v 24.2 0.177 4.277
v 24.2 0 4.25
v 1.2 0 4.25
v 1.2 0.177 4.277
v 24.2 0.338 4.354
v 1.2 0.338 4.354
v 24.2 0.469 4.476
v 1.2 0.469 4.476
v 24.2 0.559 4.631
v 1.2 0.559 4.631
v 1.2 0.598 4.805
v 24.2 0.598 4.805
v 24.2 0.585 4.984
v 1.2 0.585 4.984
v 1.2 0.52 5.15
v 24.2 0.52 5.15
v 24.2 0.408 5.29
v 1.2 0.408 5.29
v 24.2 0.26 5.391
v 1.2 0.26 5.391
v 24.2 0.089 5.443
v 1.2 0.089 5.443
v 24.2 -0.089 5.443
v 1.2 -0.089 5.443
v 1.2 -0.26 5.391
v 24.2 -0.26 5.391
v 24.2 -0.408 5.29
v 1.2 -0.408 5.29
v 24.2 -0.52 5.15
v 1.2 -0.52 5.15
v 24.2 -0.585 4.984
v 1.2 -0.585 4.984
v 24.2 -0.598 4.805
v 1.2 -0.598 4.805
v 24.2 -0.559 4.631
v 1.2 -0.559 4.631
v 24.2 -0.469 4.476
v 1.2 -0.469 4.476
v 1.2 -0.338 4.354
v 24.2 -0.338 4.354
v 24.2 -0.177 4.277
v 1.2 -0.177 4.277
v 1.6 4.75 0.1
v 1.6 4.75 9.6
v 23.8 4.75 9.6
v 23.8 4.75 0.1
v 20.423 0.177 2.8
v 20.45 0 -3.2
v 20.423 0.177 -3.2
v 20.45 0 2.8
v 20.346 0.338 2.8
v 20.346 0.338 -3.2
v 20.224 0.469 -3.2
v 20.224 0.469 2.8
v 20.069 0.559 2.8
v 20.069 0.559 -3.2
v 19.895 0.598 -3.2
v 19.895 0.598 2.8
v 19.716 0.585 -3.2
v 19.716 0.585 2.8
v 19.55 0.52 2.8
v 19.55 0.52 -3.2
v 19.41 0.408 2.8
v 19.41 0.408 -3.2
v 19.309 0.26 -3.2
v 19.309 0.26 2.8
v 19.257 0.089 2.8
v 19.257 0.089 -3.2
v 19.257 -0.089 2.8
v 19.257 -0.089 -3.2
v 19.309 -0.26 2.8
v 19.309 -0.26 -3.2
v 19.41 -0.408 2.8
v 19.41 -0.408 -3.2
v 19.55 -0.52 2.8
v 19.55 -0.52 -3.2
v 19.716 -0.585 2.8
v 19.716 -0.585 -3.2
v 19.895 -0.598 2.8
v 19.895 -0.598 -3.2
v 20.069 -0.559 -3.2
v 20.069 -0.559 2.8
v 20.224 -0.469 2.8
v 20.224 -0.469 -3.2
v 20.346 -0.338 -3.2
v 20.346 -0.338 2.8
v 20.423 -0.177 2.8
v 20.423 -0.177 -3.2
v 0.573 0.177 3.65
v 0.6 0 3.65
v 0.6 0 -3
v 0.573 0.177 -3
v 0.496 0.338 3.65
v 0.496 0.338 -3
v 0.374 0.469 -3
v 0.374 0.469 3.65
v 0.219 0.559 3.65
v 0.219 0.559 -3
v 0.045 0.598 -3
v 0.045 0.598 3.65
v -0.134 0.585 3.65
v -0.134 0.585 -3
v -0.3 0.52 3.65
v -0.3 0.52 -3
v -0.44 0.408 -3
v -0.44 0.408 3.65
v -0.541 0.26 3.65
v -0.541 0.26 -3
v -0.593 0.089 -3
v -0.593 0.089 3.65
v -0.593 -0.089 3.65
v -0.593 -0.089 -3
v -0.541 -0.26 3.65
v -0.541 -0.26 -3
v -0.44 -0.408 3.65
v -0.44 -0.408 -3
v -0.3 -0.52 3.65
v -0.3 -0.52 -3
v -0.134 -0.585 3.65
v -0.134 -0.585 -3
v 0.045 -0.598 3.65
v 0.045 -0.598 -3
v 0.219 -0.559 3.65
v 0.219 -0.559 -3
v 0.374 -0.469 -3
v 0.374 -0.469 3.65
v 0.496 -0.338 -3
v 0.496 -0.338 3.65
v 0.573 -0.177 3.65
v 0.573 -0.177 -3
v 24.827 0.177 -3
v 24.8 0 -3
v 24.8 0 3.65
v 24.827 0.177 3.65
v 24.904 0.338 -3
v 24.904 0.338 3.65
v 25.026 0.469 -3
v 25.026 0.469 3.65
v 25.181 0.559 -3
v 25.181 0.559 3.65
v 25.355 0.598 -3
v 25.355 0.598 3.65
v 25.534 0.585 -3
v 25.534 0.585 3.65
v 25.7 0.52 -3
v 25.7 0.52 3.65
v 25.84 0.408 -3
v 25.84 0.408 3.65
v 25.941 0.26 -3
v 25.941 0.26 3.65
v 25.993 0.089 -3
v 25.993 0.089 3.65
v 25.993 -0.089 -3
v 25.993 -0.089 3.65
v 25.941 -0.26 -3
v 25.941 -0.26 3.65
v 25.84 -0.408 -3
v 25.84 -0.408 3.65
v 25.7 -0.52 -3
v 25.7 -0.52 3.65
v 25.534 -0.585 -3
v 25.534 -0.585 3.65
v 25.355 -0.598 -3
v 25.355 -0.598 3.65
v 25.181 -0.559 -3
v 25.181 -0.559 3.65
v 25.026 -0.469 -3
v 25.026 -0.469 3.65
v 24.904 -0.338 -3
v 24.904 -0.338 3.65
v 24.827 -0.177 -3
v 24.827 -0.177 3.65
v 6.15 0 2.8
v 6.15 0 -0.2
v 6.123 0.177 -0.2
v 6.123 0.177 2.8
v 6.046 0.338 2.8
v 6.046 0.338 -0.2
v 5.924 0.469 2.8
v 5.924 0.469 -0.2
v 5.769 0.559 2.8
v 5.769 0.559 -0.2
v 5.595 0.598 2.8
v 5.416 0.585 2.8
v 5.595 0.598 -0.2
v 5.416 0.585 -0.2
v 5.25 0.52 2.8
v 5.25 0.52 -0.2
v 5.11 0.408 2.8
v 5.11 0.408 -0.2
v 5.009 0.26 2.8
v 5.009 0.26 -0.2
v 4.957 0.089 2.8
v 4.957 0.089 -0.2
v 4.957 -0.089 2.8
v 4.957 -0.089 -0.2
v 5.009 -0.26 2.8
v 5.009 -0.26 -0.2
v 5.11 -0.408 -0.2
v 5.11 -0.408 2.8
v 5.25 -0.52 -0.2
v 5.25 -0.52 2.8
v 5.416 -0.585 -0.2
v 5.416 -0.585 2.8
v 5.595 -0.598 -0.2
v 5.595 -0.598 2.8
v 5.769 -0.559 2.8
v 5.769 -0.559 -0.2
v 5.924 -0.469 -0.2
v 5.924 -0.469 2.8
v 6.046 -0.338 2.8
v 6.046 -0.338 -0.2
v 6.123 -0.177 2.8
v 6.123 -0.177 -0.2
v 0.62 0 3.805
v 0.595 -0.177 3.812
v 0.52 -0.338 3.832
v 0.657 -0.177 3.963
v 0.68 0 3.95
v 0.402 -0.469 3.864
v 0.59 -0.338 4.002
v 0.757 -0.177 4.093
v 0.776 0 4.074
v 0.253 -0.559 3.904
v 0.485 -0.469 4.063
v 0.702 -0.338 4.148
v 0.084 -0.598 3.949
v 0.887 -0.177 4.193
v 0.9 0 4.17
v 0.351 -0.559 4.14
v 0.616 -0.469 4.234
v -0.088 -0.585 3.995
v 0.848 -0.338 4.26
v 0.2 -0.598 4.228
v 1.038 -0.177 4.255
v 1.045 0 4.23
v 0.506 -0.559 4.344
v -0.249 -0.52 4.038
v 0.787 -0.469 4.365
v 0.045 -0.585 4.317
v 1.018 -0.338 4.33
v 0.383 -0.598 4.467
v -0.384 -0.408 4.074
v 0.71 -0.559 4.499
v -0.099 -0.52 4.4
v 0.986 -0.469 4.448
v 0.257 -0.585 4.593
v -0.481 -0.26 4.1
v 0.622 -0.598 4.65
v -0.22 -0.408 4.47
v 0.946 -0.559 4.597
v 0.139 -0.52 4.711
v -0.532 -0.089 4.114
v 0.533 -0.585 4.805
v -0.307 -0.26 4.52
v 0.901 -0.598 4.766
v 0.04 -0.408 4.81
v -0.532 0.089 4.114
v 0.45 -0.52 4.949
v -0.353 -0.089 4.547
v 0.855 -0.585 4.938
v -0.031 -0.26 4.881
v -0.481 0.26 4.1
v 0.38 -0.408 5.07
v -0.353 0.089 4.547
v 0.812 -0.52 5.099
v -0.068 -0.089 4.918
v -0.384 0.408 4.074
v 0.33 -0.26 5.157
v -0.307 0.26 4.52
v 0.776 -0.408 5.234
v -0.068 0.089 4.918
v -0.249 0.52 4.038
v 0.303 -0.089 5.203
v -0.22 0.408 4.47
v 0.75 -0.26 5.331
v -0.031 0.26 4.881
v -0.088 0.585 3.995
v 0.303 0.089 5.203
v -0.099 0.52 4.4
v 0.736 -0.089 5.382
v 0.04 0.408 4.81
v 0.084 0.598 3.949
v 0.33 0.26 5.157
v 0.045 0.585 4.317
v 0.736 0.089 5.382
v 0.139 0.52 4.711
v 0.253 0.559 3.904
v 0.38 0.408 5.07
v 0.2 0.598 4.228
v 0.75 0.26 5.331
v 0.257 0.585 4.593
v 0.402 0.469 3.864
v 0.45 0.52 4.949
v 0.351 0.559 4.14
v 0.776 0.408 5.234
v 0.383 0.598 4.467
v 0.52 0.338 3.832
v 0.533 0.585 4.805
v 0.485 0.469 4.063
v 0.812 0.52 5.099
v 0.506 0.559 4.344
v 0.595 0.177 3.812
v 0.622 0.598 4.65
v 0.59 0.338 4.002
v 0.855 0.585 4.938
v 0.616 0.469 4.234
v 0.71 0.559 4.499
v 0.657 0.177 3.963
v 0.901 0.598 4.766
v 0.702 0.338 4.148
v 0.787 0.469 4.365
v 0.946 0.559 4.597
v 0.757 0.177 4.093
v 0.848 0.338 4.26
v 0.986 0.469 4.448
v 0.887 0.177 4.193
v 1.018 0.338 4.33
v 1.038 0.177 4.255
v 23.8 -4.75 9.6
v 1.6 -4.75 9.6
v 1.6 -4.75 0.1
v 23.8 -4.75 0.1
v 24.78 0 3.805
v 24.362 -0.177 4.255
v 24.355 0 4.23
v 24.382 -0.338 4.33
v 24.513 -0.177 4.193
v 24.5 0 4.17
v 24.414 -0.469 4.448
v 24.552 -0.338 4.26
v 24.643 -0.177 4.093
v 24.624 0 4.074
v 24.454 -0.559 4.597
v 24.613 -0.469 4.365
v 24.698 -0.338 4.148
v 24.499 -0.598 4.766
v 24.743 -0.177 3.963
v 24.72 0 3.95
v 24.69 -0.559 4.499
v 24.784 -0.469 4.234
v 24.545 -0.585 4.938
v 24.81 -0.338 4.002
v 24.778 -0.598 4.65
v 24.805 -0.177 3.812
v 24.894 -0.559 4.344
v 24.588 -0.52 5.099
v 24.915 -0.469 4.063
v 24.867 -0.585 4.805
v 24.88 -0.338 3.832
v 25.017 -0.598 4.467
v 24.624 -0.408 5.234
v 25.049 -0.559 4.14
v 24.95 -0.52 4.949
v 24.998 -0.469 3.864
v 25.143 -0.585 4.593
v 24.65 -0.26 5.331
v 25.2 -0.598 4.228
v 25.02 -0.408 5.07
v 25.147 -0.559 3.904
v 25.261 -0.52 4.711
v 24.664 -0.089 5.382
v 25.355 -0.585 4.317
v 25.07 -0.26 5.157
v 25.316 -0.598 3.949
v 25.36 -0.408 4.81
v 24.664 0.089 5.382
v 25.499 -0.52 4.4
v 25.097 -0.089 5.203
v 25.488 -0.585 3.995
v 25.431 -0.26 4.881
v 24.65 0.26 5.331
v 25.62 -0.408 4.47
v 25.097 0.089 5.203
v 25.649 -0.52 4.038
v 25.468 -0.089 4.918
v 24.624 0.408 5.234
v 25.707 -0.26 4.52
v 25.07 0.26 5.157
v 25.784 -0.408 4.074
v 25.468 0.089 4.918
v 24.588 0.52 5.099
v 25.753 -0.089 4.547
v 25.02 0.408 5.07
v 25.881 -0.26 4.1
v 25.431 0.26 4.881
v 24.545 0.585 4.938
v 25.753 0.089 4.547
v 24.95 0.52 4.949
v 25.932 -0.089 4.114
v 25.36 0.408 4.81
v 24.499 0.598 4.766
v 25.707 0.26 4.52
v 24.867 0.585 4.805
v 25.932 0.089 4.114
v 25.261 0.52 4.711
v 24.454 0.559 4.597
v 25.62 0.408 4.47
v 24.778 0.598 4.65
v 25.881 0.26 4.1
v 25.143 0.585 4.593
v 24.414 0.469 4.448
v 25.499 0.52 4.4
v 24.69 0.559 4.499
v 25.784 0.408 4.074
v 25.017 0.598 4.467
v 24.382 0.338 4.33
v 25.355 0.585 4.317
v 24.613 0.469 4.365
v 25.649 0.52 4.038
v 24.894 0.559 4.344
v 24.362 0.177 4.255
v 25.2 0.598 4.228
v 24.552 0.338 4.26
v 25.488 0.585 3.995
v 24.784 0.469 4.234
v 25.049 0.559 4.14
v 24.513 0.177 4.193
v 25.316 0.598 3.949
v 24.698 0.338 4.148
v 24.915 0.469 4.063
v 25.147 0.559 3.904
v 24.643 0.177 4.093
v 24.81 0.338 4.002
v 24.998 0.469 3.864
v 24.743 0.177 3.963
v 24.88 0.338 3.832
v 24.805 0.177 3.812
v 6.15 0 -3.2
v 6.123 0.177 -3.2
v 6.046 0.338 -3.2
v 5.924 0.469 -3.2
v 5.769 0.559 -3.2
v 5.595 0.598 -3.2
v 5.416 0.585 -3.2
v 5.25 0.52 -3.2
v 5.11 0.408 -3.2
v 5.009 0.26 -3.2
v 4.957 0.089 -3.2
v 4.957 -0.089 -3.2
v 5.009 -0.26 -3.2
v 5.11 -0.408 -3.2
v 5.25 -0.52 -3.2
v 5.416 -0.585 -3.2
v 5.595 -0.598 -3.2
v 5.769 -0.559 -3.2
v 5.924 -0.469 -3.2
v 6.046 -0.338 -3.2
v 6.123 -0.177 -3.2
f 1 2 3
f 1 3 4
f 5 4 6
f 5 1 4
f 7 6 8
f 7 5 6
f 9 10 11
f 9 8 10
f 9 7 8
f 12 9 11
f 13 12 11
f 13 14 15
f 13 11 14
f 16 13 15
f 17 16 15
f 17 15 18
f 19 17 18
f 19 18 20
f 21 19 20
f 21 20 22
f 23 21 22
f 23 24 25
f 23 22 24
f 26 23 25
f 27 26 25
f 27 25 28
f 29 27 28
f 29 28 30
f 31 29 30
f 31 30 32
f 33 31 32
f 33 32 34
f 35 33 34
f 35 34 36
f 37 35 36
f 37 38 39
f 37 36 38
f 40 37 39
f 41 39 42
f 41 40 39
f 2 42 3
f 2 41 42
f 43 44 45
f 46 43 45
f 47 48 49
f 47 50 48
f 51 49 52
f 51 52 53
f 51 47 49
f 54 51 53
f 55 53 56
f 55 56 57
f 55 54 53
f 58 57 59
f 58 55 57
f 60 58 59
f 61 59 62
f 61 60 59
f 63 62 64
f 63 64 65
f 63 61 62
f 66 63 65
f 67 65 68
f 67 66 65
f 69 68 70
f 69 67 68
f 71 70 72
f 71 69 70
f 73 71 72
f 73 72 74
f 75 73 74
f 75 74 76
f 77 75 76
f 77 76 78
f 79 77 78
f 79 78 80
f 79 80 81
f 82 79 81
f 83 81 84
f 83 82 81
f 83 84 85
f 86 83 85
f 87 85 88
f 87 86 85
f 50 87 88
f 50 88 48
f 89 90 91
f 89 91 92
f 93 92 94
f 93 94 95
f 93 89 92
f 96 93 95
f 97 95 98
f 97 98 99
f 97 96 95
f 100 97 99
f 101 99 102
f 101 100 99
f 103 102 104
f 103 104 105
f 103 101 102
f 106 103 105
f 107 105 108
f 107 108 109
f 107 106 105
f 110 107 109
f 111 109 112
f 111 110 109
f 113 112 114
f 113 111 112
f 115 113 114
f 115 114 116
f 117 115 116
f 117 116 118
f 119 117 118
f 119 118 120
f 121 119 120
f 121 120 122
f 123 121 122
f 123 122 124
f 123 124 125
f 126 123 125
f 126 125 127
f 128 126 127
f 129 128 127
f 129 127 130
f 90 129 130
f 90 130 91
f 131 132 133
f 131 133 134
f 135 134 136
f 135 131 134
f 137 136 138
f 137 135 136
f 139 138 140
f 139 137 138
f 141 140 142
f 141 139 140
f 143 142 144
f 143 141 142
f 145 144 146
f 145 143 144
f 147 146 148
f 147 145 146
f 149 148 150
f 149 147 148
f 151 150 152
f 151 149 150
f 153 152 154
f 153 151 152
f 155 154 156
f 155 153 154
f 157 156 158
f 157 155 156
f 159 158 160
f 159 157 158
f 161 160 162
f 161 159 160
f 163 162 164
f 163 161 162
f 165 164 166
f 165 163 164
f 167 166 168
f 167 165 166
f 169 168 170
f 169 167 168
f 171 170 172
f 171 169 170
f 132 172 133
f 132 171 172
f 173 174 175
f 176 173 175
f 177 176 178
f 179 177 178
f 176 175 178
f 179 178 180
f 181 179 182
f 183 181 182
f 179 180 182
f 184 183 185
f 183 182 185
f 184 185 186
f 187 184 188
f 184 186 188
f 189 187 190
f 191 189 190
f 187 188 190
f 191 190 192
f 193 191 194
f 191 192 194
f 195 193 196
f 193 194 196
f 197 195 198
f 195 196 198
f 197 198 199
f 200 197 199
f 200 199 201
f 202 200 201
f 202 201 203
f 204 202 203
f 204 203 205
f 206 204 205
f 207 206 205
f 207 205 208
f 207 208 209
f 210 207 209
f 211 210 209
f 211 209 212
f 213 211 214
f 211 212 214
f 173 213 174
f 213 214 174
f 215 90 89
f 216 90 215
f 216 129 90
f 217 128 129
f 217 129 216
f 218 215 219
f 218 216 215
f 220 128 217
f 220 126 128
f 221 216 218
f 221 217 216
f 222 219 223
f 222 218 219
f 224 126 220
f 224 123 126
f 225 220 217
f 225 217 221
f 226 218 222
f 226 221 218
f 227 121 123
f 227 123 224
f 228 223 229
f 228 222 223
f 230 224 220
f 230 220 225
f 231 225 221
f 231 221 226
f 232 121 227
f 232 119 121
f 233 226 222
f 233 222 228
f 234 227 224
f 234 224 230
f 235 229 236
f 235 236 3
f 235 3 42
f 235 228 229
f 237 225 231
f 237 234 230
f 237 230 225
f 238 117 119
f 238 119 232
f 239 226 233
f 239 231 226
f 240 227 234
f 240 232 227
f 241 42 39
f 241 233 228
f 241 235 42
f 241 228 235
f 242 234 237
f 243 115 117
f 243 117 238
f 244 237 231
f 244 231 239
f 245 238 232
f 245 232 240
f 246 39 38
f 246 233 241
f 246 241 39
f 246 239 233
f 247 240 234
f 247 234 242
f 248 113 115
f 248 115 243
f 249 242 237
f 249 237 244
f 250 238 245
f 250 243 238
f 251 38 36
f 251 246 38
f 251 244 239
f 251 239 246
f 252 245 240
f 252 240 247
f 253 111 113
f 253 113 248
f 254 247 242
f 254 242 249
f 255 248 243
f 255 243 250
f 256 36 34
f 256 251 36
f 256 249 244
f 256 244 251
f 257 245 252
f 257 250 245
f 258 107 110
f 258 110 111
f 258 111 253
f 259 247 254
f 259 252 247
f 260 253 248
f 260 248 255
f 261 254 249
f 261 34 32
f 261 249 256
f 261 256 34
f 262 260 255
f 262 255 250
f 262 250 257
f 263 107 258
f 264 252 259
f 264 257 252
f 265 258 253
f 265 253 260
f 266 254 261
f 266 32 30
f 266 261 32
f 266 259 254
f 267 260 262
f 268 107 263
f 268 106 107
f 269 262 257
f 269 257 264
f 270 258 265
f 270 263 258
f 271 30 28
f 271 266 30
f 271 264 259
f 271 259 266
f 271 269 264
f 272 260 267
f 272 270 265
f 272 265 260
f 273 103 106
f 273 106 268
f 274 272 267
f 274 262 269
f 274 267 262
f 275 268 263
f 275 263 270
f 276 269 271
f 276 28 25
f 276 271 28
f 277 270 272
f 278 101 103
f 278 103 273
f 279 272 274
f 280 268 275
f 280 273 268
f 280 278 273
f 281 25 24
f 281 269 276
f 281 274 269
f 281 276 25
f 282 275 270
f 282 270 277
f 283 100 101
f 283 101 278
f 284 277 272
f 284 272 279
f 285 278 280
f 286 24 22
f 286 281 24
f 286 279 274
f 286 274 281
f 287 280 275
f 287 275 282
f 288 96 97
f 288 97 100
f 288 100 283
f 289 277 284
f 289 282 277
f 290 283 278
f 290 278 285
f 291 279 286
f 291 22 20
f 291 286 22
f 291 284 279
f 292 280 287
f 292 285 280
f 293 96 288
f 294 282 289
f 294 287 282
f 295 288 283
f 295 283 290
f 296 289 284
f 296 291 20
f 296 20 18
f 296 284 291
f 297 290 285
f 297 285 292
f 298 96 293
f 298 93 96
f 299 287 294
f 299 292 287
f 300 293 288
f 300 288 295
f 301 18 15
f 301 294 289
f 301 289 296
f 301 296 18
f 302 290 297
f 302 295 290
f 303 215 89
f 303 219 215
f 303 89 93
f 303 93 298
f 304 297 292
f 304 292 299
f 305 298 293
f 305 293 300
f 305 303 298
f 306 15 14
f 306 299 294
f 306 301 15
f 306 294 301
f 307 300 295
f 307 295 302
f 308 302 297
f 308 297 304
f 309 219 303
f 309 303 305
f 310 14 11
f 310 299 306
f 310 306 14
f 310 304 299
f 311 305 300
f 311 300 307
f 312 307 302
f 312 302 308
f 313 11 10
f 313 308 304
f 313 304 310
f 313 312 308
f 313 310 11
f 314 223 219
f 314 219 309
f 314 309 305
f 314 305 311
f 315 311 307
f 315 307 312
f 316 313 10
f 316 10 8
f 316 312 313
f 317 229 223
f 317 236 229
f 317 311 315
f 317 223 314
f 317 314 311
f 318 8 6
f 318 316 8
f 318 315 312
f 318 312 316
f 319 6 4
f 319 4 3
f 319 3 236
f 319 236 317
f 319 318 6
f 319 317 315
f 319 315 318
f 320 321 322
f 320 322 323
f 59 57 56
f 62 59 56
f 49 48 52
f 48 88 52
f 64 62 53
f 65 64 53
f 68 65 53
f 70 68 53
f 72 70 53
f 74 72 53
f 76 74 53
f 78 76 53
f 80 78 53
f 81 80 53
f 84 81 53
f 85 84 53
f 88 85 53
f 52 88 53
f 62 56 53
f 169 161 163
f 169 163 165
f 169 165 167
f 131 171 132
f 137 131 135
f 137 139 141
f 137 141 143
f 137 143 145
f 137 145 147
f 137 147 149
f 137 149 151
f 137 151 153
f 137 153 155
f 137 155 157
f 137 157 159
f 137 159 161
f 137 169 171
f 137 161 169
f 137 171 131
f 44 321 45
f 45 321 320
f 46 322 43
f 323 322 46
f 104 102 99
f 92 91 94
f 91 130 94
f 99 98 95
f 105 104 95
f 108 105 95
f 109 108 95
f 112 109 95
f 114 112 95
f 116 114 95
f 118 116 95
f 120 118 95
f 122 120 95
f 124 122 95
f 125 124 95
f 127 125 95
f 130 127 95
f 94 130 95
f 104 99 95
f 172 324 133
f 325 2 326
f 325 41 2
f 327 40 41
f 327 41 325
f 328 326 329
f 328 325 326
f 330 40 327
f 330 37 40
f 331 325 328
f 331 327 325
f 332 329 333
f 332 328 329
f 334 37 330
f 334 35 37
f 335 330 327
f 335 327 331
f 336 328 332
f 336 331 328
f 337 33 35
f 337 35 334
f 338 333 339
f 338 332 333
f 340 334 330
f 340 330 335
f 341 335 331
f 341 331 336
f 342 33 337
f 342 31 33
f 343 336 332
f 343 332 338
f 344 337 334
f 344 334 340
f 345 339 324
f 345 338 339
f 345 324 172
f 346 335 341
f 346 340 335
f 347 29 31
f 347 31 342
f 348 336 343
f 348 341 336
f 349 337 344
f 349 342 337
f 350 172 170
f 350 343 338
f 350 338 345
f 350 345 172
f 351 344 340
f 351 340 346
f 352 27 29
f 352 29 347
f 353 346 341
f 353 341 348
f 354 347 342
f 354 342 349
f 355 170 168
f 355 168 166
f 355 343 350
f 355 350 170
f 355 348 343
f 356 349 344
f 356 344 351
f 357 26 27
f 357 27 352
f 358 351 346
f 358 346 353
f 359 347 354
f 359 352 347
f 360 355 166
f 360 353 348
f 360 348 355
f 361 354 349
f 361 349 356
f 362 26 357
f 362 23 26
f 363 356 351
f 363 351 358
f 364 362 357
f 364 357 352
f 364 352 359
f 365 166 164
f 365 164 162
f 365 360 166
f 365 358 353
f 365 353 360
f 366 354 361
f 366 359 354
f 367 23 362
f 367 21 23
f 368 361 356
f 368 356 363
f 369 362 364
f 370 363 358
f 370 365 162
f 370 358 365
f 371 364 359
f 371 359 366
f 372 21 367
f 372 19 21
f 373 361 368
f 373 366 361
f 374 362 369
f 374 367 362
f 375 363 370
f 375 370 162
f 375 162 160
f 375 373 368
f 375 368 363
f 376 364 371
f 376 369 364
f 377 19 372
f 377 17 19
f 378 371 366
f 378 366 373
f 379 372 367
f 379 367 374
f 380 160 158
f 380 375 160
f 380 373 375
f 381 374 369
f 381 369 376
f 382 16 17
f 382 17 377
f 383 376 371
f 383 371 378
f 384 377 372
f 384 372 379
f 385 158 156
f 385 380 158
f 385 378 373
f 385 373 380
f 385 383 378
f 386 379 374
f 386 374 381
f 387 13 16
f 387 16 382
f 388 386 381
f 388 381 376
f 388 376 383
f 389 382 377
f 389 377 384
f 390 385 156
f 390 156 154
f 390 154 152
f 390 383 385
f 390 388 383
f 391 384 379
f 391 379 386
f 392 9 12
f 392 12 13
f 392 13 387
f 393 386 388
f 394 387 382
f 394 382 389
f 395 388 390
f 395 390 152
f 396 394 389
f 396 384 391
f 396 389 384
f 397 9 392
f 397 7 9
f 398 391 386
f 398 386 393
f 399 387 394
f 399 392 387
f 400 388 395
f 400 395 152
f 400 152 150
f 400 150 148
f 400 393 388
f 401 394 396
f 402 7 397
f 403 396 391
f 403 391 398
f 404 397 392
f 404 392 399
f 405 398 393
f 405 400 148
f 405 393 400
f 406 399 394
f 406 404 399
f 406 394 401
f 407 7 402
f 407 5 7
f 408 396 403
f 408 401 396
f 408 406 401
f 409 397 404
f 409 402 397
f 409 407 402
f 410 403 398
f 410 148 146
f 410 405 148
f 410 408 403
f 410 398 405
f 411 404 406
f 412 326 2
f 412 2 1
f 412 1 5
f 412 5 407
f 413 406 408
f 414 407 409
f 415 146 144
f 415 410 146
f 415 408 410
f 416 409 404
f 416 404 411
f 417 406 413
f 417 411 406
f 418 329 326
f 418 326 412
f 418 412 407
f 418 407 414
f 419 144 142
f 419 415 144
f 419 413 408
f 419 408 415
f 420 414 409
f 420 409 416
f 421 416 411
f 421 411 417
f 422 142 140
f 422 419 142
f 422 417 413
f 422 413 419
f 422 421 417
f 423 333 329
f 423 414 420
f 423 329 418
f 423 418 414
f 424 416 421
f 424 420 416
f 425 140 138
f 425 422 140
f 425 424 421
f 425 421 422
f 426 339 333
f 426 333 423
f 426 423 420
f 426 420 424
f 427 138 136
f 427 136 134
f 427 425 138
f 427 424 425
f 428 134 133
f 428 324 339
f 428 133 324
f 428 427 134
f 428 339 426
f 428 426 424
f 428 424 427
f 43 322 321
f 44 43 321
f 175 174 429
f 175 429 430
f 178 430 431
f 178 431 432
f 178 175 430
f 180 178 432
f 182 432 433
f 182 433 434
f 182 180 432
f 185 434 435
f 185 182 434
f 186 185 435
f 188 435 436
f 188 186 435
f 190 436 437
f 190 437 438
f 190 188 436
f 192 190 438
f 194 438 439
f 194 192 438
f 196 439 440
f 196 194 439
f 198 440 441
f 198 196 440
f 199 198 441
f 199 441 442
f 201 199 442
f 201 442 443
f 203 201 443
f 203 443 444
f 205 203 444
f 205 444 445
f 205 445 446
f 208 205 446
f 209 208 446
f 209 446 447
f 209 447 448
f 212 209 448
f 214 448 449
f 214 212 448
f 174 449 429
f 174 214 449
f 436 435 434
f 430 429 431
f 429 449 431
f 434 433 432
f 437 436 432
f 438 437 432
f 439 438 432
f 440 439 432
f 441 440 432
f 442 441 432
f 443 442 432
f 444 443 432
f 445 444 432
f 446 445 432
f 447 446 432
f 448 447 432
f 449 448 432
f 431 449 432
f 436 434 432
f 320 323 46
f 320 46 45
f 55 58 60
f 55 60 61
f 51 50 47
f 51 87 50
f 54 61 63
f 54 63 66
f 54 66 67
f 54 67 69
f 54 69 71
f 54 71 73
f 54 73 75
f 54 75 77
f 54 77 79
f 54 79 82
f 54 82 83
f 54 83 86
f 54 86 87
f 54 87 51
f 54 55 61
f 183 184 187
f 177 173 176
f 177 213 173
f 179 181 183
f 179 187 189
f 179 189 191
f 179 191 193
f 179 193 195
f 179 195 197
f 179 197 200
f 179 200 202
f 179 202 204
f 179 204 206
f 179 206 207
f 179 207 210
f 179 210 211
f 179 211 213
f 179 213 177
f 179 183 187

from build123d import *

# Parameters (mm, degrees)
SKETCH_R     = 0.6
SKETCH002_W  = 22.2
SKETCH002_H  = 9.5
PAD_DEPTH    = 4.75
SKETCH004_R  = 0.6
PAD001_DEPTH = 3


with BuildPart() as sweep_body:
    # Sweep: sweep along a path in Sketch001
    with BuildLine(Plane.XZ) as sweep_path:
        Line((0, -3), (0, 3.65))
        ThreePointArc((0, 3.65), (0.351476, 4.498532), (1.200011, 4.85))
        Line((1.200011, 4.85), (24.2, 4.85))
        ThreePointArc((24.2, 4.85), (25.048528, 4.498528), (25.4, 3.65))
        Line((25.4, 3.65), (25.4, -3))
    # Sketch → Sweep (sweep)
    with BuildSketch(Plane.XY.offset(-2)):
        Circle(SKETCH_R)
    sweep(path=sweep_path.line)


with BuildPart() as pad:
    # Sketch002 → Pad (new body, symmetric)
    with BuildSketch(Plane.XZ):
        with Locations((12.7, 4.85)):
            Rectangle(SKETCH002_W, SKETCH002_H)
    extrude(amount=PAD_DEPTH, both=True)


with BuildPart() as pad001:
    # Sketch004 → Pad001 (new body, symmetric)
    with BuildSketch(Plane.XY.offset(-0.2)):
        with Locations((5.55, 0)):
            Circle(SKETCH004_R)
        with Locations((19.85, 0)):
            Circle(SKETCH004_R)
    extrude(amount=PAD001_DEPTH, both=True)


solid = Compound([sweep_body.part, pad.part, pad001.part])
